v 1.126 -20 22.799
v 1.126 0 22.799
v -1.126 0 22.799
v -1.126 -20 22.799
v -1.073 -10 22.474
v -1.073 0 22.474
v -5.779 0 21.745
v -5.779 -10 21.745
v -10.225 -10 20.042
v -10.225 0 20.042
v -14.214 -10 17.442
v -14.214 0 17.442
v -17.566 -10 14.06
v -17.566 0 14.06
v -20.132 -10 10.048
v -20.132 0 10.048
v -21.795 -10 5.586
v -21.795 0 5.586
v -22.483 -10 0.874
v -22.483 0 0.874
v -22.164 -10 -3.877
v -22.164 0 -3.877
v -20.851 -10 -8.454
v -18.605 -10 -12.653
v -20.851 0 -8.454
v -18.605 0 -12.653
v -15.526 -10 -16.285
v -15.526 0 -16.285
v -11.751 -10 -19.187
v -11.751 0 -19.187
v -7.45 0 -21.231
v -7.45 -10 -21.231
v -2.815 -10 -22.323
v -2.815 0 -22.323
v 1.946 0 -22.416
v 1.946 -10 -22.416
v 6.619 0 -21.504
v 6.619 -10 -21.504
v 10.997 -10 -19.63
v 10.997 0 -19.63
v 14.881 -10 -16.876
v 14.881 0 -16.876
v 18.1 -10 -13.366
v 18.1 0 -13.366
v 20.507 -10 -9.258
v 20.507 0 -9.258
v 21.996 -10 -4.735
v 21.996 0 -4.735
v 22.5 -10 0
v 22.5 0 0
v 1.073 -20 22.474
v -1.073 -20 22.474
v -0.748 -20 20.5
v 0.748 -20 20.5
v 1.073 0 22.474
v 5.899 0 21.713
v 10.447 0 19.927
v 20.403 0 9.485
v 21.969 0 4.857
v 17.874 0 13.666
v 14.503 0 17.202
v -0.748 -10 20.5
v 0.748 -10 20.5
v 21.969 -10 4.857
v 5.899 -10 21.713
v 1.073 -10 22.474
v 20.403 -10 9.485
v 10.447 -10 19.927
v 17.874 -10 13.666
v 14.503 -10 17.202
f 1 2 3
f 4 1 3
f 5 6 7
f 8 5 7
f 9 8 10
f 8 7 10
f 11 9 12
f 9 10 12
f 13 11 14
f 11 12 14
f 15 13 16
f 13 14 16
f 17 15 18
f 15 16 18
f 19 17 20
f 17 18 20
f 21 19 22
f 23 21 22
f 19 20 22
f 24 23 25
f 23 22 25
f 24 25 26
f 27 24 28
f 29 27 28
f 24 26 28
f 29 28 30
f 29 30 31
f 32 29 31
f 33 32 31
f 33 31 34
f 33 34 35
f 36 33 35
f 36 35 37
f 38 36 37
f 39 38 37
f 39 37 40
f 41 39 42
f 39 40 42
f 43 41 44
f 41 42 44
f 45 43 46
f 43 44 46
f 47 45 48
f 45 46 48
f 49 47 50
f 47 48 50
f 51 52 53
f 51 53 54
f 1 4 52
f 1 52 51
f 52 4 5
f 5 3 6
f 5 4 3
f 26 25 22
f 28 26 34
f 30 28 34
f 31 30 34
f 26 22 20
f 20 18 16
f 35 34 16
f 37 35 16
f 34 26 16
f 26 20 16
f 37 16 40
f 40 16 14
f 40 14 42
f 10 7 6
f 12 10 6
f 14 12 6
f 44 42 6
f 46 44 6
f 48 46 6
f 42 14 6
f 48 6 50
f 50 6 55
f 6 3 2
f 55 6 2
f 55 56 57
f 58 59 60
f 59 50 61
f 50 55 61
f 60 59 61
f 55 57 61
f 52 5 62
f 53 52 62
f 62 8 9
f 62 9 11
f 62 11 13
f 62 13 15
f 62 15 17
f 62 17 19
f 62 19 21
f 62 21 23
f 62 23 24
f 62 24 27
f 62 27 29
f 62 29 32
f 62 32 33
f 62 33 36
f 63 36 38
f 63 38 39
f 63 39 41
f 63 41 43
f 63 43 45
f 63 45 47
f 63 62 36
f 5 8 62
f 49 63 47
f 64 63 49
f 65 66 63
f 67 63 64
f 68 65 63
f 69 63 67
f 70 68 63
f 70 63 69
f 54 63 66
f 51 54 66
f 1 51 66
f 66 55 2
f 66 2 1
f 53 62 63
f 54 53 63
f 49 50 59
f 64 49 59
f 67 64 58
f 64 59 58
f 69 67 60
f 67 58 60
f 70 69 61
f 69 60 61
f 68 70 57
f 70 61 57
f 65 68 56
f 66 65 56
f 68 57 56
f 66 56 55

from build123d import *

# Parameters (mm, degrees)
F1_DEPTH = 20
F2_DEPTH = 10


with BuildPart() as f1:
    # F0 (on Front) → F1 (new body)
    with BuildSketch(Plane.XZ):
        with BuildLine():
            Line((0.7485, 20.5), (1.072906, 22.474405))
            ThreePointArc((1.072906, 22.474405), (0, 22.5), (-1.072906, 22.474405))
            Line((-1.072906, 22.474405), (-0.7485, 20.5))
            Line((-0.7485, 20.5), (0.7485, 20.5))
        make_face()
        with BuildLine():
            ThreePointArc((-1.072906, 22.474405), (0, 22.5), (1.072906, 22.474405))
            Line((1.072906, 22.474405), (1.12626, 22.799129))
            Line((1.12626, 22.799129), (-1.12626, 22.799129))
            Line((-1.12626, 22.799129), (-1.072906, 22.474405))
        make_face()
    extrude(amount=F1_DEPTH)

    # F0 (on Front) → F2 (join)
    with BuildSketch(Plane.XZ):
        with BuildLine():
            ThreePointArc((-1.072906, 22.474405), (-15.52594, -16.284815), (22.5, 0))
            ThreePointArc((22.5, 0), (16.284815, 15.52594), (1.072906, 22.474405))
            Line((1.072906, 22.474405), (0.7485, 20.5))
            Line((0.7485, 20.5), (-0.7485, 20.5))
            Line((-0.7485, 20.5), (-1.072906, 22.474405))
        make_face()
    extrude(amount=F2_DEPTH)


solid = f1.part
